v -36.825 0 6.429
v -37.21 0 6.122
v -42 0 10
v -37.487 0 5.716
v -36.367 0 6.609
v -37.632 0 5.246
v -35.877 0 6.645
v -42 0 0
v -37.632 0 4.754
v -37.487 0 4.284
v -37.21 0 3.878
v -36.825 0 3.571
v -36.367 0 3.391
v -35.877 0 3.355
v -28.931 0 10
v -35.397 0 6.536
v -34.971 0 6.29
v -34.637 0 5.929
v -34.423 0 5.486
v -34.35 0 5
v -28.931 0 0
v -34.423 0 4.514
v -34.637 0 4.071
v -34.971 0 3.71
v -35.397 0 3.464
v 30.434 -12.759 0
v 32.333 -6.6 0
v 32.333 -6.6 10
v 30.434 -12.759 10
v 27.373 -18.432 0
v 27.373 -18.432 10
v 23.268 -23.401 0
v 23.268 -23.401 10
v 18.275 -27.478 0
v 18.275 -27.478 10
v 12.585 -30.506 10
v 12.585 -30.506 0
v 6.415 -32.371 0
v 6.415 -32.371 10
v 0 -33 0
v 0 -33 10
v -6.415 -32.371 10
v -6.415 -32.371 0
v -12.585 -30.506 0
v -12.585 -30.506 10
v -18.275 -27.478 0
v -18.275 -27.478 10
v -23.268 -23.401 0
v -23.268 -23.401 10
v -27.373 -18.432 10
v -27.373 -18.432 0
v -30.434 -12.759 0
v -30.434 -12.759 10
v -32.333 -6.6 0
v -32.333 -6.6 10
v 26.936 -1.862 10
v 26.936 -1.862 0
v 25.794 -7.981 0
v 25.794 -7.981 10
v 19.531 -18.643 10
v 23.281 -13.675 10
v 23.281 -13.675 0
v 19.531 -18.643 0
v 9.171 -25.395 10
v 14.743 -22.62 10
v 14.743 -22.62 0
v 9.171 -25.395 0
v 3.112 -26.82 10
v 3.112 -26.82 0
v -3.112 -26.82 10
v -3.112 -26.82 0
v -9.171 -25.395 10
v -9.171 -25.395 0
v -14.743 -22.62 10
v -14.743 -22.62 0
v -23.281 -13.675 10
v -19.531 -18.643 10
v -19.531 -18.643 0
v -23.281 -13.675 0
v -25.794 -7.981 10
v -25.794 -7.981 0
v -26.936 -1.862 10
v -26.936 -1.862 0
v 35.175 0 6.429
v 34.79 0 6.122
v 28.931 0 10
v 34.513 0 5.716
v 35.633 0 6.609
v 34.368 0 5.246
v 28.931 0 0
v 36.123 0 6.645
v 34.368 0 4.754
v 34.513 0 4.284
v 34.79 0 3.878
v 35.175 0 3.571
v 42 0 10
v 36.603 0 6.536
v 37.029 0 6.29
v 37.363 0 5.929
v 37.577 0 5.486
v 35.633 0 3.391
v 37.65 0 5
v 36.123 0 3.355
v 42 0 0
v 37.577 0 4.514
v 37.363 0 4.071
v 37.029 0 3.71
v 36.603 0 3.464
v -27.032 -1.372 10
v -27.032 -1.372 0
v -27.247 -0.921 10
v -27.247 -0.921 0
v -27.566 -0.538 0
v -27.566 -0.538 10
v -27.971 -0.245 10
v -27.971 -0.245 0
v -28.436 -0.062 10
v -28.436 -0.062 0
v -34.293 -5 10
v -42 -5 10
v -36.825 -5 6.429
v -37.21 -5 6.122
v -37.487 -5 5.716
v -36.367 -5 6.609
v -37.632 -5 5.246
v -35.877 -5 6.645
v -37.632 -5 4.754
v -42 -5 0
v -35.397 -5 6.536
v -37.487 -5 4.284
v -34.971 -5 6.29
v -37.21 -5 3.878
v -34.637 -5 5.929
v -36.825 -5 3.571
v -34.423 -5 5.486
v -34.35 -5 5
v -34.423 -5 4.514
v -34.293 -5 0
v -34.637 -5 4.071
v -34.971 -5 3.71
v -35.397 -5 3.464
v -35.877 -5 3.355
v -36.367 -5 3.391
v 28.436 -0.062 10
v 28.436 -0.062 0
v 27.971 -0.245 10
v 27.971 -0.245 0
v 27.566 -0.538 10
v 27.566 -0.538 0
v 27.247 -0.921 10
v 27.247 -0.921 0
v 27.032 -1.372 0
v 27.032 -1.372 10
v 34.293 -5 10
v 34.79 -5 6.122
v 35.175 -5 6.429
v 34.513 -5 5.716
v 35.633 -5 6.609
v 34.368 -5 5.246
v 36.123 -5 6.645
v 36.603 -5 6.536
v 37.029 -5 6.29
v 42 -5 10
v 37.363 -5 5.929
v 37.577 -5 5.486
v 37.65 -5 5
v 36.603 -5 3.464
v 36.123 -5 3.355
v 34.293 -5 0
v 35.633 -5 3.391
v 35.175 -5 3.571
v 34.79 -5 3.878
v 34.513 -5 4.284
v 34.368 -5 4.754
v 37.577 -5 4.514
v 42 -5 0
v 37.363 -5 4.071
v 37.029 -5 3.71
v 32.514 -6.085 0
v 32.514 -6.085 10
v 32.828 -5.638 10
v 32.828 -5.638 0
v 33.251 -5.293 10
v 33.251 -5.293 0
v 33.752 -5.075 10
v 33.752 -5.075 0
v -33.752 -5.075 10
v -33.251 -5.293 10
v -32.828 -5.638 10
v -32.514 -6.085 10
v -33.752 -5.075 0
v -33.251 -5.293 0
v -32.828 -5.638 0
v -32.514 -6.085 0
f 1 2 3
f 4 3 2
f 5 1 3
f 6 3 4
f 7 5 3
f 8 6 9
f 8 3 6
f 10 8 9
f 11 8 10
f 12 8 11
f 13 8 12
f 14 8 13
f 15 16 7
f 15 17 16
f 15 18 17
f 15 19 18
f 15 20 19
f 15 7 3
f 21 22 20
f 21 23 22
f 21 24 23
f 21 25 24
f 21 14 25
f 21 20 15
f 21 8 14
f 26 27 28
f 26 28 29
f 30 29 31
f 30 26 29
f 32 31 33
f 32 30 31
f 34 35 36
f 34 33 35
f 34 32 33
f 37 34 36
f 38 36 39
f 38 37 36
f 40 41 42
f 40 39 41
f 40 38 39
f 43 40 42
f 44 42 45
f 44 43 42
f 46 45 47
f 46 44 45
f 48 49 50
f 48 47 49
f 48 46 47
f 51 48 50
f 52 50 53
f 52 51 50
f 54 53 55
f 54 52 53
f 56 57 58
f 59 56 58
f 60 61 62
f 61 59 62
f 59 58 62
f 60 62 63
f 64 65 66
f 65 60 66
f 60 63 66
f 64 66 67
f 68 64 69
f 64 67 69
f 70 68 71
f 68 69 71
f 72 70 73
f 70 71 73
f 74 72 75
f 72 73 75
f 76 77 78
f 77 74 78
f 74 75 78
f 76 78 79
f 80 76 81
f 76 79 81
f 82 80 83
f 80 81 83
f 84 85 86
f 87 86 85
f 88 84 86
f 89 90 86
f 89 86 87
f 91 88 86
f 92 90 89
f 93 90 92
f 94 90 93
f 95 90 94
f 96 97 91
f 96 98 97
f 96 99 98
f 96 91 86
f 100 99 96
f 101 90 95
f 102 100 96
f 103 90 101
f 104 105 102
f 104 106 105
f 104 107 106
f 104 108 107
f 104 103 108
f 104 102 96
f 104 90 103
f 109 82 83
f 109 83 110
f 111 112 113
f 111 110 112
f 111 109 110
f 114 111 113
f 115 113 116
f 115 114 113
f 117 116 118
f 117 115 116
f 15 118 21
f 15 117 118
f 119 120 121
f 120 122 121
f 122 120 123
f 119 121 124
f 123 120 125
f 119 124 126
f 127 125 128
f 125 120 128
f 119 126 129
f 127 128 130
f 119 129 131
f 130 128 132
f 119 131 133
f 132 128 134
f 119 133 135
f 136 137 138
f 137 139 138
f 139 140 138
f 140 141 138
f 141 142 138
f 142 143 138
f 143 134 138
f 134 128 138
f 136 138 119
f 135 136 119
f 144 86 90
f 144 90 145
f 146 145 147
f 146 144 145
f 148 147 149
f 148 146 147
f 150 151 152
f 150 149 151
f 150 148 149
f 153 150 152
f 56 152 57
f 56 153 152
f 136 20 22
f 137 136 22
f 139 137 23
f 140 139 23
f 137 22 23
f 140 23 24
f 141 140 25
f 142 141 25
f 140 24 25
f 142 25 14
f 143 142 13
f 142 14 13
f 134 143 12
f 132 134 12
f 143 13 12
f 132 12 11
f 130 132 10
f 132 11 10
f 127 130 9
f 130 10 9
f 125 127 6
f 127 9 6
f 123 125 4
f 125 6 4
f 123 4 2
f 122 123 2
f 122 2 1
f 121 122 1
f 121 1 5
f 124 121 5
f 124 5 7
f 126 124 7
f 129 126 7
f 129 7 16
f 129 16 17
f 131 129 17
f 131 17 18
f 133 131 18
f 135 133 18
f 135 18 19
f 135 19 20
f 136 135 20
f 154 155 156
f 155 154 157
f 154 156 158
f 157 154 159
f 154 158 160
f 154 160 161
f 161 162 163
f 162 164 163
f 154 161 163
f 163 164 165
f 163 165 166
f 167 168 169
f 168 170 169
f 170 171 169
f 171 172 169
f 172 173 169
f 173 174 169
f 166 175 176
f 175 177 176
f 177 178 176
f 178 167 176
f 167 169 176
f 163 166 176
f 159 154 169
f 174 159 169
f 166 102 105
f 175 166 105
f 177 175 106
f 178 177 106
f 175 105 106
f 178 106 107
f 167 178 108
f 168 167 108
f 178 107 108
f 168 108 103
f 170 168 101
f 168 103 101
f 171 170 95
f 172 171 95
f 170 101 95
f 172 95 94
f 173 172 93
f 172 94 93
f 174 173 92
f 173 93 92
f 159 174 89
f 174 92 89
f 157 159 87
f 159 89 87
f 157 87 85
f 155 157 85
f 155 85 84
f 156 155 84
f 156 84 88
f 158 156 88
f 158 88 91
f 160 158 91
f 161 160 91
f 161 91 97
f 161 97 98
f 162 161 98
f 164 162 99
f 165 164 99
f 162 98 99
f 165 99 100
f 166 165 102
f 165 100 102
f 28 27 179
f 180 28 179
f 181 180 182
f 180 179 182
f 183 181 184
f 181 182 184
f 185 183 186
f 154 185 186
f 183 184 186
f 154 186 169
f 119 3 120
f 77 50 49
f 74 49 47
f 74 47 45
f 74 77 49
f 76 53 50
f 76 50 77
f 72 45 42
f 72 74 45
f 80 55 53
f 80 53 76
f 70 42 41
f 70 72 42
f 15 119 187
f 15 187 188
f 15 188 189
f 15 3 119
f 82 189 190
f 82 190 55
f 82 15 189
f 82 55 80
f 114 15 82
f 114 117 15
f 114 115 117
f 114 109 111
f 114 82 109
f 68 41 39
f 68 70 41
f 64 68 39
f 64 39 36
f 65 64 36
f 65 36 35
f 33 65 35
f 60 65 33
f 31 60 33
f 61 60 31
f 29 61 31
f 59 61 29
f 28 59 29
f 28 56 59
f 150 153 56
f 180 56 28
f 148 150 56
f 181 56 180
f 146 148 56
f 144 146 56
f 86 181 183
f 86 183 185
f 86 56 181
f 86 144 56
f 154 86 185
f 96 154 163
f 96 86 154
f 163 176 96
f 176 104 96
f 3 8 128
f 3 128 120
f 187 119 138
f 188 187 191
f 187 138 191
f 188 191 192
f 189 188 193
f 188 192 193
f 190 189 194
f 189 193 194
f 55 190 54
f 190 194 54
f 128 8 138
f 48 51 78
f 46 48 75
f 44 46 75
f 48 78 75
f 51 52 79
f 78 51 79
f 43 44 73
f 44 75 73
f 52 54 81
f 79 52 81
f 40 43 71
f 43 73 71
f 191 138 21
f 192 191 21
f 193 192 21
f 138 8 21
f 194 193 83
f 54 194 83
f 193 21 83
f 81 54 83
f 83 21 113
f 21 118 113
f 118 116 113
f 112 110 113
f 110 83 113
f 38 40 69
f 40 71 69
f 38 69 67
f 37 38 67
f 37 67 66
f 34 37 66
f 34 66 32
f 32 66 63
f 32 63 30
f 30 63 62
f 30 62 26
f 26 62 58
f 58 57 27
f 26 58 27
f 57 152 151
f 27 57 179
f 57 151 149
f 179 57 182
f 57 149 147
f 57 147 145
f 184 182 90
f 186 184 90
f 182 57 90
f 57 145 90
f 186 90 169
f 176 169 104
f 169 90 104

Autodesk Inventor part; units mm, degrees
ref_plane "YZ Plane" through (0, 0, 0) normal (1, 0, 0) x (0, 1, 0)
ref_plane "XZ Plane" through (0, 0, 0) normal (0, 1, 0) x (-1, 0, 0)
ref_plane "XY Plane" through (0, 0, 0) normal (0, 0, 1) x (1, 0, 0)
sketch "Sketch1" plane through (0, 0, 0) normal (0, 0, 1) x (1, 0, 0)
  arc A0 (-33, 0) -> (33, 0) centre (0, 0) ccw
  arc A1 (-27, 0) -> (27, 0) centre (0, 0) ccw
  line L0 (-33, 0) -> (-27, 0)
  line L1 (27, 0) -> (33, 0)
  dimension "d0" = 66
  dimension "d1" = 54
extrude "Extrusion1" add sketch "Sketch1" along normal blind 10
sketch "Sketch2" plane through (-33, 0, 0) normal (0, 1, 0) x (1, 0, 0)
  line L0 (6, 0) -> (6, -10) projected
  line L1 (6, 0) -> (-9, 0)
  line L2 (-9, 0) -> (-9, -10)
  line L3 (-9, -10) -> (6, -10)
  line L4 (6, -10) -> (6, 0)
  line L5 (66, 0) -> (60, 0) projected
  line L6 (60, 0) -> (75, 0)
  line L7 (75, 0) -> (75, -10)
  line L8 (75, -10) -> (60, -10)
  line L9 (60, -10) -> (60, 0)
  point P0 (33, 0)
  dimension "d4" = 15
extrude "Extrusion2" add sketch "Sketch2" against normal blind 5
sketch "Sketch3" plane through (-27, 0, 10) normal (0, 1, 0) x (1, 0, 0)
  circle A0 centre (-9, 5) radius 1.65
  circle A1 centre (63, 5) radius 1.65
  line L0 (0, 10) -> (-15, 10) projected
  line L1 (-15, 10) -> (-15, 0) projected
  line L2 (69, 10) -> (54, 10) projected
  line L3 (69, 0) -> (69, 10) projected
  point P0 (27, 10)
  dimension "d7" = 5
  dimension "d8" = 6
  dimension "d9" = 5
  dimension "d10" = 6
  dimension "d11" = 3.3
extrude "Extrusion3" cut sketch "Sketch3" against normal blind 5
fillet "Fillet1" radius 2 4 edges at (-27, 0, 5) (-32.619, -5, 5) (32.619, -5, 5) (27, 0, 5)
properties part number "22010B_Tube End Support_V2" material "ABS Plastic"
